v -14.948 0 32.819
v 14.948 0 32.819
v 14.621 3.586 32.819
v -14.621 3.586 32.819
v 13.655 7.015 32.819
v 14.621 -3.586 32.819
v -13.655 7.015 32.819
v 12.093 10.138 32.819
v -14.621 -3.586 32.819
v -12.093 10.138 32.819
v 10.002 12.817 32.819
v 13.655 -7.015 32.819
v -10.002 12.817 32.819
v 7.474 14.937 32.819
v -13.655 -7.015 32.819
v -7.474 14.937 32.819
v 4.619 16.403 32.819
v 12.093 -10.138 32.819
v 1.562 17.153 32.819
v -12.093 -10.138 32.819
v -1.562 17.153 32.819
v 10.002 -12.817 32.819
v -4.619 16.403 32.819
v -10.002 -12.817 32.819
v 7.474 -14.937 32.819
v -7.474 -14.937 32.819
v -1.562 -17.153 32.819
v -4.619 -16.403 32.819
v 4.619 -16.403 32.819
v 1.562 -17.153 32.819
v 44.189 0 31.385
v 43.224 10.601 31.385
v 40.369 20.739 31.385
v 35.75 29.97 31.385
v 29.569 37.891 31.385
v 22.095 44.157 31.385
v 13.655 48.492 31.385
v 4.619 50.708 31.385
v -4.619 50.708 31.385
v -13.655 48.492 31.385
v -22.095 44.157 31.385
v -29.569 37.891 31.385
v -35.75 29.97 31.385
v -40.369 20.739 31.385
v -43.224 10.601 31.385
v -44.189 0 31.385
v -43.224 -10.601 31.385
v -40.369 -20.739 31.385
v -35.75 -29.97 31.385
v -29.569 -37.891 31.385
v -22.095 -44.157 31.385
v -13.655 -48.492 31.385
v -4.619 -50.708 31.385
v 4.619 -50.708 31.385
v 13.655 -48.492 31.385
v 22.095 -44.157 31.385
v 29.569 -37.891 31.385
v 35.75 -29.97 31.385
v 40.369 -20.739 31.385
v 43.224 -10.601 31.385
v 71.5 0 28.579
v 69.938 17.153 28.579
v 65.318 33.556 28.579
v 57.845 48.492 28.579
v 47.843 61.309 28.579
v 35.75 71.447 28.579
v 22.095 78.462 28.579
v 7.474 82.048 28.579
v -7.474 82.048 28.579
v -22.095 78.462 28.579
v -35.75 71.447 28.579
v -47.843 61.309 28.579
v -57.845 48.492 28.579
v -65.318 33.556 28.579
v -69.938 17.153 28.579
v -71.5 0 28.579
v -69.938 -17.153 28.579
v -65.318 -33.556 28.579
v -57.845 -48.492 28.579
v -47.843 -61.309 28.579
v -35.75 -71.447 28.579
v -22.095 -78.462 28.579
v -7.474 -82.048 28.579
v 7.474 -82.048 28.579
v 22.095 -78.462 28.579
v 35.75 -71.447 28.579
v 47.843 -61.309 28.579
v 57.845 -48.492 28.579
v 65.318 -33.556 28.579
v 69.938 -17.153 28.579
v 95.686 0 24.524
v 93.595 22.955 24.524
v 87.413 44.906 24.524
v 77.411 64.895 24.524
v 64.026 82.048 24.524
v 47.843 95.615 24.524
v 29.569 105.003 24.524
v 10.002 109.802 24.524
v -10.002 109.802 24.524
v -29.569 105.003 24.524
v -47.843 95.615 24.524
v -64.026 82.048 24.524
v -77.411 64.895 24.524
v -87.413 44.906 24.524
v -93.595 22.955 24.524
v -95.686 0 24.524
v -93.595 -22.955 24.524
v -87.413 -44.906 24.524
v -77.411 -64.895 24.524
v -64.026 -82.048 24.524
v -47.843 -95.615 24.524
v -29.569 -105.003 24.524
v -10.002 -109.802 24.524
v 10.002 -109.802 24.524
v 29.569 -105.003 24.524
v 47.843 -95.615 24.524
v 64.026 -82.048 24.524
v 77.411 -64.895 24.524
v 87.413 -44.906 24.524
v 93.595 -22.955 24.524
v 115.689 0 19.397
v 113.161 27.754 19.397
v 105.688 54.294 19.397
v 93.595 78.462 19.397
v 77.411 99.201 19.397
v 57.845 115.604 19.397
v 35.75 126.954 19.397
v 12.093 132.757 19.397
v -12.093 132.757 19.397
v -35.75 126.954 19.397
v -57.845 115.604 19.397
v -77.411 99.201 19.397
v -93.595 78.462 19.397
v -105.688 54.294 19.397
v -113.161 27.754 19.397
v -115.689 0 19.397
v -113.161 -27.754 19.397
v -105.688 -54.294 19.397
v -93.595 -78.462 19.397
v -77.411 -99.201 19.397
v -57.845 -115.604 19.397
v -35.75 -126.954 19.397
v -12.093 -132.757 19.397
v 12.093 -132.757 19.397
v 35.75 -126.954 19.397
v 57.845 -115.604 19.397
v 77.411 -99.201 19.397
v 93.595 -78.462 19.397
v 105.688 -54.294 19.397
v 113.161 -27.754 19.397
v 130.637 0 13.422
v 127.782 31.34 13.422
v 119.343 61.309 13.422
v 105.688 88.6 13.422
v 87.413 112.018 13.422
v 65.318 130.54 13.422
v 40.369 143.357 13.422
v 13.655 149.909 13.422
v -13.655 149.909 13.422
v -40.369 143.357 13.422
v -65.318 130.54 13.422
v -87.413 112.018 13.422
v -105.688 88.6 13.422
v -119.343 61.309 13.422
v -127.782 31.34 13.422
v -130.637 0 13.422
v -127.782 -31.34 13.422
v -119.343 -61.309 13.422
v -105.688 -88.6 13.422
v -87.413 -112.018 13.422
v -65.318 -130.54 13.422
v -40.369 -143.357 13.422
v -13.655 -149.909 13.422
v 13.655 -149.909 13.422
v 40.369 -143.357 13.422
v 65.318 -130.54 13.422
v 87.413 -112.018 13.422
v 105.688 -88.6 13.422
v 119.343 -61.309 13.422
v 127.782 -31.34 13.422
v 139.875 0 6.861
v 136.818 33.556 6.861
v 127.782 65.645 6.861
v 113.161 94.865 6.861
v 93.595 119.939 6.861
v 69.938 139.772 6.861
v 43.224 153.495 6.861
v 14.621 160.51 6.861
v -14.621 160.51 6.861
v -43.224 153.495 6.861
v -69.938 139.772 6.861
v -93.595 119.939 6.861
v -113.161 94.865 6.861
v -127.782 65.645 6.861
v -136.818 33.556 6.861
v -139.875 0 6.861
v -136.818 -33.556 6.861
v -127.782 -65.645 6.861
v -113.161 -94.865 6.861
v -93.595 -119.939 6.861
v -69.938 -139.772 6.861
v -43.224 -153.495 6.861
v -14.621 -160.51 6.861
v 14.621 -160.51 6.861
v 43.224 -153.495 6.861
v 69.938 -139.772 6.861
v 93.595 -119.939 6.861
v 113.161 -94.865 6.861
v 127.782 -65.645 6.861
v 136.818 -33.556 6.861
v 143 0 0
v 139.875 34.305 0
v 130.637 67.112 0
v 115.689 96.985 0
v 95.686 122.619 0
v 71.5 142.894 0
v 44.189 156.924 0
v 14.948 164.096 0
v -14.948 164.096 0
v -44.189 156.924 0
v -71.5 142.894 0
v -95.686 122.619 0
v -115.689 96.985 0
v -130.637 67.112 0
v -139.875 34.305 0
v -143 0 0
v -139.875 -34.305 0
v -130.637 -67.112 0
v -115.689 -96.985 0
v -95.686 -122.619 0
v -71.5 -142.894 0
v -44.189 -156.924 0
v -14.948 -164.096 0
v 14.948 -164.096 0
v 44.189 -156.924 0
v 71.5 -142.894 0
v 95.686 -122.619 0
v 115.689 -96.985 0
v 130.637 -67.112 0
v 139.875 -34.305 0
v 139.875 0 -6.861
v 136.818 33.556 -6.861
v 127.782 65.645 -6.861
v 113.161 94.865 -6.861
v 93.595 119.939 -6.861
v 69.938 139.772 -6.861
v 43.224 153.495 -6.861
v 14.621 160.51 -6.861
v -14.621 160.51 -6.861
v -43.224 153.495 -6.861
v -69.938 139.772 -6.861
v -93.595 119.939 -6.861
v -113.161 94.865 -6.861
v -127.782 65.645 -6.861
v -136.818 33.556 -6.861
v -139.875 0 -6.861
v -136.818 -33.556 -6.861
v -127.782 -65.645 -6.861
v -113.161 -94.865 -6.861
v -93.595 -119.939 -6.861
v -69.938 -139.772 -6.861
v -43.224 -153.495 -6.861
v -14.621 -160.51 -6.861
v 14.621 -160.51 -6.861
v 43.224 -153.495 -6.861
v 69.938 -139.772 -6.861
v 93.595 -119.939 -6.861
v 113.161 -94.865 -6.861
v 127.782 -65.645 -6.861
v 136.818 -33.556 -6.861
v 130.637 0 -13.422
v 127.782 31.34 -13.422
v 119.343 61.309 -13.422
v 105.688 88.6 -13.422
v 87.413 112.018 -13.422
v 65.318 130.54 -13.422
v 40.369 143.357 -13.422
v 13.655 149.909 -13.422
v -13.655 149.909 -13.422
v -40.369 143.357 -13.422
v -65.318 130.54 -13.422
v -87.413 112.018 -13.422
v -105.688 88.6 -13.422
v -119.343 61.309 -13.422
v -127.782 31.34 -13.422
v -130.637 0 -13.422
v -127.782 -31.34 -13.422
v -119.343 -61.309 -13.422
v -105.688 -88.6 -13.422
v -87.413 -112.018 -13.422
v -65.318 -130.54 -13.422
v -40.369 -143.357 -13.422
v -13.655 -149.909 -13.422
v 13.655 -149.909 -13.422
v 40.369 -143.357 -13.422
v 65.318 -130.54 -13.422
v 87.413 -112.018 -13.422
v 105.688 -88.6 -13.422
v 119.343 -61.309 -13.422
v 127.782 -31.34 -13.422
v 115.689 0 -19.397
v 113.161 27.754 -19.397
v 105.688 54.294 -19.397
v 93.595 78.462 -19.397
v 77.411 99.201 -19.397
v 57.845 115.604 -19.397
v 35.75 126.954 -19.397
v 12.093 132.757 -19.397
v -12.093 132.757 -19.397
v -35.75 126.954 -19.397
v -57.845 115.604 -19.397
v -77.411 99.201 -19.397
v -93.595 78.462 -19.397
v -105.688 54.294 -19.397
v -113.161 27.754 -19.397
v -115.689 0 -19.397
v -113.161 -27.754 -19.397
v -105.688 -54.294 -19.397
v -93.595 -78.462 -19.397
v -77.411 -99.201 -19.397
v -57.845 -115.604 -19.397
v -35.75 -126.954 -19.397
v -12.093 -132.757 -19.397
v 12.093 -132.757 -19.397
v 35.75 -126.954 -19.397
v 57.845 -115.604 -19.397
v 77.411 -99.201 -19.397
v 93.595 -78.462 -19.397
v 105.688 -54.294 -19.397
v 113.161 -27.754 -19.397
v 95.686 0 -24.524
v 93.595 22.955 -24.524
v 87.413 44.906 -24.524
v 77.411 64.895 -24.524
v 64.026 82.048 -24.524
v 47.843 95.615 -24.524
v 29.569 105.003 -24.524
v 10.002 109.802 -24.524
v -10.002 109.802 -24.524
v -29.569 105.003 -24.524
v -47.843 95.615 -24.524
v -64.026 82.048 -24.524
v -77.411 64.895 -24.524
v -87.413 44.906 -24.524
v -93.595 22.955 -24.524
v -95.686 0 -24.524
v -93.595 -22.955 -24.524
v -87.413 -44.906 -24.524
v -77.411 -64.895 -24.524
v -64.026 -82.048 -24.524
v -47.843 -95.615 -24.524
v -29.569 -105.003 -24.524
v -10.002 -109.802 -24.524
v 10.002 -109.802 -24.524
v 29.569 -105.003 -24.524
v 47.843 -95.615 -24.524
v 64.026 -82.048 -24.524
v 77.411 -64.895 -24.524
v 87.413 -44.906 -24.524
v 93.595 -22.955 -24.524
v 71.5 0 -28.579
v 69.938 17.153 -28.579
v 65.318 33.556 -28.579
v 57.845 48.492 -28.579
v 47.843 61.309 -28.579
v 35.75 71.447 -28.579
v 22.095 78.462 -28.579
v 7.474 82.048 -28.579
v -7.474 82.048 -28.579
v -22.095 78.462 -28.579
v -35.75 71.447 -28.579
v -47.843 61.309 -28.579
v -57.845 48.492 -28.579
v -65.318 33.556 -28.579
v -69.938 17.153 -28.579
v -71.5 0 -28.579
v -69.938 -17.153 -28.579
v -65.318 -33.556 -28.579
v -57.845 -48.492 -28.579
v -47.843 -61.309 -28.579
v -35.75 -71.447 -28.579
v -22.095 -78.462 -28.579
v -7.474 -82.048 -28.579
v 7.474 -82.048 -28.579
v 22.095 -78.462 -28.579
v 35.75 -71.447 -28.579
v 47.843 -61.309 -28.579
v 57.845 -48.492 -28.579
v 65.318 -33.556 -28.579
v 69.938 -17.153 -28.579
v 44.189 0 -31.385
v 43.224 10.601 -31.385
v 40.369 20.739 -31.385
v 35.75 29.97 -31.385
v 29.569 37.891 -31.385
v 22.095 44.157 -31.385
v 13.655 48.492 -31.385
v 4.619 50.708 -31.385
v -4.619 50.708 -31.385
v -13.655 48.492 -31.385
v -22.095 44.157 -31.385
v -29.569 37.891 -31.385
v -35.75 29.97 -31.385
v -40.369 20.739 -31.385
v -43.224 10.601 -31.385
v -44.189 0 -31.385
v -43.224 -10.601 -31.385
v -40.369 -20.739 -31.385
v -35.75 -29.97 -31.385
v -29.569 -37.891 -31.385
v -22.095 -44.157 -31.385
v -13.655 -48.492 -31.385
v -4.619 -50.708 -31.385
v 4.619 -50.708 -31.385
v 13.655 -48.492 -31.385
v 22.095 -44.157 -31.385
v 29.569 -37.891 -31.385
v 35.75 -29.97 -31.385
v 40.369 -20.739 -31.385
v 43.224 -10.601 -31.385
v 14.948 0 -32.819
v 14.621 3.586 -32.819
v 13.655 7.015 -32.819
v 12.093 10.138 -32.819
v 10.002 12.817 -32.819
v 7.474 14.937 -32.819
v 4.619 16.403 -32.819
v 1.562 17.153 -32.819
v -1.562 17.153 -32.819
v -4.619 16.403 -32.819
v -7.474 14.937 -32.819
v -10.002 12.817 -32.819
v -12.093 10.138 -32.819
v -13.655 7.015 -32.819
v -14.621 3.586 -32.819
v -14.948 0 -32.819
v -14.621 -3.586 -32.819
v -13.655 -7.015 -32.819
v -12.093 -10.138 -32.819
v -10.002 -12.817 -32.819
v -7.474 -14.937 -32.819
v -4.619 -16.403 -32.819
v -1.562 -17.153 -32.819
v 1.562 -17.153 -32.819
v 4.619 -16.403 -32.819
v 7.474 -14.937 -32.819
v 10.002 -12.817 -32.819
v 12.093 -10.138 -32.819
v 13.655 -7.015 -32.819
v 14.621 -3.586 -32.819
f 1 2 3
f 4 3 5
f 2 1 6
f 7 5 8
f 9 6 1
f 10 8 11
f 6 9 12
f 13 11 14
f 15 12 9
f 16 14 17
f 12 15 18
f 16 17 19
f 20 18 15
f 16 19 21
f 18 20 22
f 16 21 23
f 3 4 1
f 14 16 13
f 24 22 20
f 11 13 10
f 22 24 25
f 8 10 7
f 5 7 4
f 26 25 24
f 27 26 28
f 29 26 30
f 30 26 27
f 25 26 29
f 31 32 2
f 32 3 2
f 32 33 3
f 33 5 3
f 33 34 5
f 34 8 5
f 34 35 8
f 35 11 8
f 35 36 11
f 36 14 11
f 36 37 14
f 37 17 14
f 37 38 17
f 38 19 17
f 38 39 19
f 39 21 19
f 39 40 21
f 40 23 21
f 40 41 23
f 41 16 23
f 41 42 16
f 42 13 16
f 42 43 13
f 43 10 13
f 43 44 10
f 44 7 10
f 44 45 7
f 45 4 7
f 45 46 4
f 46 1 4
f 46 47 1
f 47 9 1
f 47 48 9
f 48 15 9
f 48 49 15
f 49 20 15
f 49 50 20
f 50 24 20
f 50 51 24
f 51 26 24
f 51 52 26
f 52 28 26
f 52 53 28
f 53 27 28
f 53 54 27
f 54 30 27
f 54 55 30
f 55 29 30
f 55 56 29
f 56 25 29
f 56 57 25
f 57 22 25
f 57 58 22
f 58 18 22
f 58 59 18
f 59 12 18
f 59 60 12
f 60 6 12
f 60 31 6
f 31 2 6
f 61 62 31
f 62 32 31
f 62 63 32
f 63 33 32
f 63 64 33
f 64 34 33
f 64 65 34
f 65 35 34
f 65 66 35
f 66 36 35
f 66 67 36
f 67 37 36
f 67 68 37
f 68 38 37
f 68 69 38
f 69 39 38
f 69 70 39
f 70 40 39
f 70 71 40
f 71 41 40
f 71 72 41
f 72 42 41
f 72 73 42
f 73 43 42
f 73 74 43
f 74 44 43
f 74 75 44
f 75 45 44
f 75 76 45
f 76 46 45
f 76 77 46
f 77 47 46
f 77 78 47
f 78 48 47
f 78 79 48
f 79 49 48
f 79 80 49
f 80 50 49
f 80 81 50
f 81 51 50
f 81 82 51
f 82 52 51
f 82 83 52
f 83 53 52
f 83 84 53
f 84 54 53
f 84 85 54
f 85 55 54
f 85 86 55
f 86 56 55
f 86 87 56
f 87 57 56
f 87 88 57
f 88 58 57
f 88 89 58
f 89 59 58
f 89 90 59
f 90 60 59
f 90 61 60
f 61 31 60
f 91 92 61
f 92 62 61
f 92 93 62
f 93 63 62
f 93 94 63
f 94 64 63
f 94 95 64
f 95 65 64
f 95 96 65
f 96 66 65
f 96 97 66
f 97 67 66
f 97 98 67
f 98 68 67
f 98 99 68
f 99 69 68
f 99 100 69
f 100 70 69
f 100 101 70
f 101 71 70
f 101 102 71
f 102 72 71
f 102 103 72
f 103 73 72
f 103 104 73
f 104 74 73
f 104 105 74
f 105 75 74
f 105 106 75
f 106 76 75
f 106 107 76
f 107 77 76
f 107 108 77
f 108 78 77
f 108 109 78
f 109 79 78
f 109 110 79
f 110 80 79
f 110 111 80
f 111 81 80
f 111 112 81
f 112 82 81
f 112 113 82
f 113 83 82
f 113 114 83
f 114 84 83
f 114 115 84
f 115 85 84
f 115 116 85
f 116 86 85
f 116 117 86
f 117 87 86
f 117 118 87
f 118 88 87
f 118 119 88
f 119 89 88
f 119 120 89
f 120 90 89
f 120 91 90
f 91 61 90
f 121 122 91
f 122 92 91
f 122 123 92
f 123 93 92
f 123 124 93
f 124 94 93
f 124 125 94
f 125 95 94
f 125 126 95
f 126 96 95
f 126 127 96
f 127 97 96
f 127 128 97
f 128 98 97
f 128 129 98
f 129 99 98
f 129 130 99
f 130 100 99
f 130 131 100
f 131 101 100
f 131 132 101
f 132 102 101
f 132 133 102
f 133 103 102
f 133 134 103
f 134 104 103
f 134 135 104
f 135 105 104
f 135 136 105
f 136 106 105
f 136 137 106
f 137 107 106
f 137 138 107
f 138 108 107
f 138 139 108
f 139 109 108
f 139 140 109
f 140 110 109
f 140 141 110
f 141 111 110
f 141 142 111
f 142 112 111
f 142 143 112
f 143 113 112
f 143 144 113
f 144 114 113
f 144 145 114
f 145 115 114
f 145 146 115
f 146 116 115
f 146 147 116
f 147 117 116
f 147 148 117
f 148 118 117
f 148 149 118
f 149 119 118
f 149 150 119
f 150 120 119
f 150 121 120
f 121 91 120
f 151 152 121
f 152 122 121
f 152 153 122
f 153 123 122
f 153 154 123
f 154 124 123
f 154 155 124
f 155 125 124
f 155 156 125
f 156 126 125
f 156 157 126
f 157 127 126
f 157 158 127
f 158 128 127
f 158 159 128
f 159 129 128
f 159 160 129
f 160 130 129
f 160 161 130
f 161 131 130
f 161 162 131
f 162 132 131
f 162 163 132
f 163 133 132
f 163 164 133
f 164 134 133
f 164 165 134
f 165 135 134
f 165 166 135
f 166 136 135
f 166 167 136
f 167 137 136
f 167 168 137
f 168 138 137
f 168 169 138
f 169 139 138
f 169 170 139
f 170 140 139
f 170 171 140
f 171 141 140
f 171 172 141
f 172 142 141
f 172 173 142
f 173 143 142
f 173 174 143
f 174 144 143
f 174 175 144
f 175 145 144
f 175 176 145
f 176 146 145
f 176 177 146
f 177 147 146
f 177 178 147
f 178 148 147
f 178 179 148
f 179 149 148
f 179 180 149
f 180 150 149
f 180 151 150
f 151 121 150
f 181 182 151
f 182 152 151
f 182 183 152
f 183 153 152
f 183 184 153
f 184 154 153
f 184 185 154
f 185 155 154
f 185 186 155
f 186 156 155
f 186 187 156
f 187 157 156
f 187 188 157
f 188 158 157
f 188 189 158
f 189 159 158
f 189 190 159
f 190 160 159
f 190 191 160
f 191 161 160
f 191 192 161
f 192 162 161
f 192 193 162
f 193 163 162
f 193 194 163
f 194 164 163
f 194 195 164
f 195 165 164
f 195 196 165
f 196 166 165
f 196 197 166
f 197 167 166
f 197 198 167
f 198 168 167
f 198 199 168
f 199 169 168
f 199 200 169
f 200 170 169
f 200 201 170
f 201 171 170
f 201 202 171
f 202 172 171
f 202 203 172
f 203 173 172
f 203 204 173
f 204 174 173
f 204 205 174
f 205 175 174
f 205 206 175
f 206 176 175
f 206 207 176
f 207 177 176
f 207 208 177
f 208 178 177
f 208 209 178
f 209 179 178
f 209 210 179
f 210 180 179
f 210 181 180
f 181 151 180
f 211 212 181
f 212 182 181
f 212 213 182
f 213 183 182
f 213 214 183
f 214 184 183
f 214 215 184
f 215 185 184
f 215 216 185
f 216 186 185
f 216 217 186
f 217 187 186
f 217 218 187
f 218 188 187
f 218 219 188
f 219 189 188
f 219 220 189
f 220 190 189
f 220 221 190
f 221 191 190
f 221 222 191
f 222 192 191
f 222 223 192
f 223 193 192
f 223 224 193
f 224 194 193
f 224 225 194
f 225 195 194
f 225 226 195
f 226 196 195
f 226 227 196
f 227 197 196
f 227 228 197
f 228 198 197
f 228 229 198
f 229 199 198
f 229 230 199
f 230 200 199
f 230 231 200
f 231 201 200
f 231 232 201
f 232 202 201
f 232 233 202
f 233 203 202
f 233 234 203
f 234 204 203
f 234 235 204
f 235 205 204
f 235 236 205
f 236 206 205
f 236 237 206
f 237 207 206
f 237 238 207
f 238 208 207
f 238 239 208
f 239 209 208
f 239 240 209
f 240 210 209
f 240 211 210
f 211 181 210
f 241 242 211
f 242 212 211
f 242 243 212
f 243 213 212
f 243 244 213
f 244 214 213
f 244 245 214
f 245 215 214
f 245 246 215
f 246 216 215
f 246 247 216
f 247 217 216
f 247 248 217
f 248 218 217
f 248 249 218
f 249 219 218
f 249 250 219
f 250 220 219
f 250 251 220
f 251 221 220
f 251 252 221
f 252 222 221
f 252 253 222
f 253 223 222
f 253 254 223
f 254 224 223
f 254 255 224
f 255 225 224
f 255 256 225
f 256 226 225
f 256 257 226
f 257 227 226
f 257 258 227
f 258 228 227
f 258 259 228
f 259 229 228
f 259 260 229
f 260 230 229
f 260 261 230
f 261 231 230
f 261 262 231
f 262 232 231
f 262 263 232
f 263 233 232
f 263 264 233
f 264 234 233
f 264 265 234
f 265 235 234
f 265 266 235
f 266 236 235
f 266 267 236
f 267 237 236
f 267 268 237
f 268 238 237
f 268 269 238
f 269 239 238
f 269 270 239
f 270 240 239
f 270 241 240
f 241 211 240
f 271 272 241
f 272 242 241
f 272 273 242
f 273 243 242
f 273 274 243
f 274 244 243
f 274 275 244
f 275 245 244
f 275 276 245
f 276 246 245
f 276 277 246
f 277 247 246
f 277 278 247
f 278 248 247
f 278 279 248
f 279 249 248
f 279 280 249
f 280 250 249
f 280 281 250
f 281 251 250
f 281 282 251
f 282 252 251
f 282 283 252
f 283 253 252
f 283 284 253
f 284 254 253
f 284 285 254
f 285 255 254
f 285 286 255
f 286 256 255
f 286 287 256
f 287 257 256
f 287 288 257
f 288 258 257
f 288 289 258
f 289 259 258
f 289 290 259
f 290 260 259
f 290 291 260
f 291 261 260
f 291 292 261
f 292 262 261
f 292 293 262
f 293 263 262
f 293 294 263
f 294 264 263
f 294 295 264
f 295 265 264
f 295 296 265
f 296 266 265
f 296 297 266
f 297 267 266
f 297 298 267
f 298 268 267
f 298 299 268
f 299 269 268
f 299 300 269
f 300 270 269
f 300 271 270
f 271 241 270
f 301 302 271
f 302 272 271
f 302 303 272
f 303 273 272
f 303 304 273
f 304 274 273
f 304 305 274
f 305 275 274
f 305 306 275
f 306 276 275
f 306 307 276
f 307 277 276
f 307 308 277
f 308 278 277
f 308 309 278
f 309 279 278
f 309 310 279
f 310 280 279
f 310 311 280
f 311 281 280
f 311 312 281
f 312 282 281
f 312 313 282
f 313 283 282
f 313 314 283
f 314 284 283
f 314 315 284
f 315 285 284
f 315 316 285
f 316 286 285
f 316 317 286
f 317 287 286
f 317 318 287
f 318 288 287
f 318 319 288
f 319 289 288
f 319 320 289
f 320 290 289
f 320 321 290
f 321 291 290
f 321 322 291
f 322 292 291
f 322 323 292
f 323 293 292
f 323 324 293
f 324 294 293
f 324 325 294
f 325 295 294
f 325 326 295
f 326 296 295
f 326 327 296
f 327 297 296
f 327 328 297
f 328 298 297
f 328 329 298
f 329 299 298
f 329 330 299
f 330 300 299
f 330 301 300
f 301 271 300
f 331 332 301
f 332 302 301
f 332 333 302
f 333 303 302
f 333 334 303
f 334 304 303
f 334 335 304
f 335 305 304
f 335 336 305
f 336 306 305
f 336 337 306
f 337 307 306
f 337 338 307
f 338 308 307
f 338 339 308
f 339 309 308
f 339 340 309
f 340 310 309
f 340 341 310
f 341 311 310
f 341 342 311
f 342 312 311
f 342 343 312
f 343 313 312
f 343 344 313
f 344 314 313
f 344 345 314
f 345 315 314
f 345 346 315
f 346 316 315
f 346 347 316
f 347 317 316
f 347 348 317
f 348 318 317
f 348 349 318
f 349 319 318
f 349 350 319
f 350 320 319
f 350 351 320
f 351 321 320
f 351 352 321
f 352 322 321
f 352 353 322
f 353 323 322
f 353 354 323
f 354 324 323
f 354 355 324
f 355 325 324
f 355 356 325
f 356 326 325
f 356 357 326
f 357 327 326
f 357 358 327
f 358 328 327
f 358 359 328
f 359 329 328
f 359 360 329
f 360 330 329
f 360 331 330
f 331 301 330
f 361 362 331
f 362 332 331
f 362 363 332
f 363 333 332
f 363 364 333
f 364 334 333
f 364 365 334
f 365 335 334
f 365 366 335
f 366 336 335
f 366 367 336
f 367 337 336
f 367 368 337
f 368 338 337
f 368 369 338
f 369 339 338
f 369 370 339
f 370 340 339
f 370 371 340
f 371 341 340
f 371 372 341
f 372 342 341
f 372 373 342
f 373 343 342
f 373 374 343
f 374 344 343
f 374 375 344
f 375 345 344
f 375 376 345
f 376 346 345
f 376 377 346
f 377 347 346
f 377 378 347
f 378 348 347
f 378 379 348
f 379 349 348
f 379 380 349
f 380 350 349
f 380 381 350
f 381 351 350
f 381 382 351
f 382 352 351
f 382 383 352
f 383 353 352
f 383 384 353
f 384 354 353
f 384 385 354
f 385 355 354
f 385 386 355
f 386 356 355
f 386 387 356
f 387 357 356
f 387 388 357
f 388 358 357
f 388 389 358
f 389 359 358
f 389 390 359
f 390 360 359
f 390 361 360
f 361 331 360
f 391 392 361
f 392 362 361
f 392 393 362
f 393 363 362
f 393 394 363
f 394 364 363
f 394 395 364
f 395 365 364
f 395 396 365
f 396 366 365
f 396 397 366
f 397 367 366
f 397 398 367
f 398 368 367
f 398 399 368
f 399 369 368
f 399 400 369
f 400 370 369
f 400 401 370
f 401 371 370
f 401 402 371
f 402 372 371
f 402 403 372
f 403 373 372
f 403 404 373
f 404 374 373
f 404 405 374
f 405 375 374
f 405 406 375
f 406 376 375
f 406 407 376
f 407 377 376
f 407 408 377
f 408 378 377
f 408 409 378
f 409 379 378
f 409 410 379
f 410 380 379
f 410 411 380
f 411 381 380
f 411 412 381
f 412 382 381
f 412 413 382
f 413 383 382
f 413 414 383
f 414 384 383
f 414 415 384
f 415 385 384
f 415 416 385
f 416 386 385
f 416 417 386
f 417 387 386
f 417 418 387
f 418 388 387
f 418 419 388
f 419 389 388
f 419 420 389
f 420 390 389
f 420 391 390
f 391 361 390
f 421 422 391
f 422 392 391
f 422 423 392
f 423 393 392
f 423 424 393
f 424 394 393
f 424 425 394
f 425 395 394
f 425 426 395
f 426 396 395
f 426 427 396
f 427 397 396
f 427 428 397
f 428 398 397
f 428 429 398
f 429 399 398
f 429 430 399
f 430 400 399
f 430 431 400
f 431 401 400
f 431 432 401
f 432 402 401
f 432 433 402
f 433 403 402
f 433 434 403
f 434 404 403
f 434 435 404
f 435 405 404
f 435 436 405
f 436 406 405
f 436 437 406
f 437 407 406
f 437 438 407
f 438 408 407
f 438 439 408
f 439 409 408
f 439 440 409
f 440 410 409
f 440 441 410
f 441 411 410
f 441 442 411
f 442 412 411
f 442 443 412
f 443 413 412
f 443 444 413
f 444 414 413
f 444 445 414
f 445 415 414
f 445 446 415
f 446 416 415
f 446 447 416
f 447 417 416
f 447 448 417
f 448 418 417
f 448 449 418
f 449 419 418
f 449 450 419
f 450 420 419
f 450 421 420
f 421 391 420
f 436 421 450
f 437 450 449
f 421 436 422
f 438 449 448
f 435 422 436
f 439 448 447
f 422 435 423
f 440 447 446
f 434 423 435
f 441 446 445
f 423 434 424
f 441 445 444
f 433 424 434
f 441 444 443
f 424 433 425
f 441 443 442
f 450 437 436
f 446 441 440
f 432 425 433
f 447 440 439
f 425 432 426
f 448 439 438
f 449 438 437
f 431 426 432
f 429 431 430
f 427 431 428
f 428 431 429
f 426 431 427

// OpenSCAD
// Generated by SolidPython 1.0.1 on 2020-07-29 00:46:51


scale(v = [13, 15, 3]) {
	sphere(r = 11);
}
/***********************************************
*********      SolidPython code:      **********
************************************************
 
# import packages: SolidPython
from solid import *
from solid.utils import *
from itertools import chain, combinations, permutations


class Resize:

    def __init__(self, scad_file):
        self.scad_file = scad_file
        #self.scad_file = import_scad(scad_file)
        # cone/cylinder param:
        self.r1 = 0
        self.r2 = 0
        self.h = 0
        # rectangular prism param:
        self.w = 0
        self.l = 0
        # ellipse param:
        self.r = 0

    # import OpenScad code (file name corresponds to shape)


    # classify shape + parameters
    def assign(self, param1, param2, param3):
        if self.scad_file == 'cone.scad':
            self.r1 = param1
            self.r2 = param2
            self.h = param3
        elif self.scad_file == 'cylinder.scad':
            self.r1 = param1
            self.r2 = param2
            self.h = param3
        elif self.scad_file == 'rectangularPrism.scad':
            self.h = param1
            self.l = param2
            self.w = param3
        else:
            self.r = param1
            self.h = param2

    # resize parameters
    def iterate(self):
        x = range(3, 20, 2)
        i = 1
        if self.scad_file == 'cone.scad':
            tempList = list(permutations(x, 2))
            for temp in tempList:
                param1 = temp[0]
                param2 = temp[1]
                filepath = 'produced_scad_files/' + 'cone' + str(param1) + '_' + str(param2) + '_' + '.scad'
                scad_render_to_file(cylinder(h=param1, r1=param2, r2=0), filepath)

        elif self.scad_file == 'cylinder.scad':
            tempList = list(permutations(x, 3))
            for temp in tempList:
                param1 = temp[0]
                param2 = temp[1]
                filepath = 'produced_scad_files/' + 'cylinder' + str(param1) + '_' + str(param2) + '_' + '.scad'
                scad_render_to_file(cylinder(h=param1, r1=param2, r2=param2), filepath)

        elif self.scad_file == 'rectangularPrism.scad':
            tempList = list(permutations(x, 3))
            for temp in tempList:
                param1 = temp[0]
                param2 = temp[1]
                param3 = temp[2]
                filepath = 'produced_scad_files/' + 'rectangularPrism' + str(param1) + '_' + str(param2) + '_' + str(
                    param3) + '.scad'
                scad_render_to_file(cube(size=(param1, param2, param3)), filepath)

        elif self.scad_file == 'ellipse.scad':
            tempList = list(permutations(x, 4))
            for temp in tempList:
                param1 = temp[0]
                param2 = temp[1]
                param3 = temp[2]
                param4 = temp[3]
                filepath = 'produced_scad_files/' + 'ellipse' + str(param1) + '_' + str(param2) + '_' + str(param3) + '_' + str(param4) + '.scad'
                scad_render_to_file(scale([param1, param2, param3])(sphere(r=param4)), filepath)

    def render_to_scadfile(self):
        scad_render_to_file(scad, 'example.scad') 
 
************************************************/
